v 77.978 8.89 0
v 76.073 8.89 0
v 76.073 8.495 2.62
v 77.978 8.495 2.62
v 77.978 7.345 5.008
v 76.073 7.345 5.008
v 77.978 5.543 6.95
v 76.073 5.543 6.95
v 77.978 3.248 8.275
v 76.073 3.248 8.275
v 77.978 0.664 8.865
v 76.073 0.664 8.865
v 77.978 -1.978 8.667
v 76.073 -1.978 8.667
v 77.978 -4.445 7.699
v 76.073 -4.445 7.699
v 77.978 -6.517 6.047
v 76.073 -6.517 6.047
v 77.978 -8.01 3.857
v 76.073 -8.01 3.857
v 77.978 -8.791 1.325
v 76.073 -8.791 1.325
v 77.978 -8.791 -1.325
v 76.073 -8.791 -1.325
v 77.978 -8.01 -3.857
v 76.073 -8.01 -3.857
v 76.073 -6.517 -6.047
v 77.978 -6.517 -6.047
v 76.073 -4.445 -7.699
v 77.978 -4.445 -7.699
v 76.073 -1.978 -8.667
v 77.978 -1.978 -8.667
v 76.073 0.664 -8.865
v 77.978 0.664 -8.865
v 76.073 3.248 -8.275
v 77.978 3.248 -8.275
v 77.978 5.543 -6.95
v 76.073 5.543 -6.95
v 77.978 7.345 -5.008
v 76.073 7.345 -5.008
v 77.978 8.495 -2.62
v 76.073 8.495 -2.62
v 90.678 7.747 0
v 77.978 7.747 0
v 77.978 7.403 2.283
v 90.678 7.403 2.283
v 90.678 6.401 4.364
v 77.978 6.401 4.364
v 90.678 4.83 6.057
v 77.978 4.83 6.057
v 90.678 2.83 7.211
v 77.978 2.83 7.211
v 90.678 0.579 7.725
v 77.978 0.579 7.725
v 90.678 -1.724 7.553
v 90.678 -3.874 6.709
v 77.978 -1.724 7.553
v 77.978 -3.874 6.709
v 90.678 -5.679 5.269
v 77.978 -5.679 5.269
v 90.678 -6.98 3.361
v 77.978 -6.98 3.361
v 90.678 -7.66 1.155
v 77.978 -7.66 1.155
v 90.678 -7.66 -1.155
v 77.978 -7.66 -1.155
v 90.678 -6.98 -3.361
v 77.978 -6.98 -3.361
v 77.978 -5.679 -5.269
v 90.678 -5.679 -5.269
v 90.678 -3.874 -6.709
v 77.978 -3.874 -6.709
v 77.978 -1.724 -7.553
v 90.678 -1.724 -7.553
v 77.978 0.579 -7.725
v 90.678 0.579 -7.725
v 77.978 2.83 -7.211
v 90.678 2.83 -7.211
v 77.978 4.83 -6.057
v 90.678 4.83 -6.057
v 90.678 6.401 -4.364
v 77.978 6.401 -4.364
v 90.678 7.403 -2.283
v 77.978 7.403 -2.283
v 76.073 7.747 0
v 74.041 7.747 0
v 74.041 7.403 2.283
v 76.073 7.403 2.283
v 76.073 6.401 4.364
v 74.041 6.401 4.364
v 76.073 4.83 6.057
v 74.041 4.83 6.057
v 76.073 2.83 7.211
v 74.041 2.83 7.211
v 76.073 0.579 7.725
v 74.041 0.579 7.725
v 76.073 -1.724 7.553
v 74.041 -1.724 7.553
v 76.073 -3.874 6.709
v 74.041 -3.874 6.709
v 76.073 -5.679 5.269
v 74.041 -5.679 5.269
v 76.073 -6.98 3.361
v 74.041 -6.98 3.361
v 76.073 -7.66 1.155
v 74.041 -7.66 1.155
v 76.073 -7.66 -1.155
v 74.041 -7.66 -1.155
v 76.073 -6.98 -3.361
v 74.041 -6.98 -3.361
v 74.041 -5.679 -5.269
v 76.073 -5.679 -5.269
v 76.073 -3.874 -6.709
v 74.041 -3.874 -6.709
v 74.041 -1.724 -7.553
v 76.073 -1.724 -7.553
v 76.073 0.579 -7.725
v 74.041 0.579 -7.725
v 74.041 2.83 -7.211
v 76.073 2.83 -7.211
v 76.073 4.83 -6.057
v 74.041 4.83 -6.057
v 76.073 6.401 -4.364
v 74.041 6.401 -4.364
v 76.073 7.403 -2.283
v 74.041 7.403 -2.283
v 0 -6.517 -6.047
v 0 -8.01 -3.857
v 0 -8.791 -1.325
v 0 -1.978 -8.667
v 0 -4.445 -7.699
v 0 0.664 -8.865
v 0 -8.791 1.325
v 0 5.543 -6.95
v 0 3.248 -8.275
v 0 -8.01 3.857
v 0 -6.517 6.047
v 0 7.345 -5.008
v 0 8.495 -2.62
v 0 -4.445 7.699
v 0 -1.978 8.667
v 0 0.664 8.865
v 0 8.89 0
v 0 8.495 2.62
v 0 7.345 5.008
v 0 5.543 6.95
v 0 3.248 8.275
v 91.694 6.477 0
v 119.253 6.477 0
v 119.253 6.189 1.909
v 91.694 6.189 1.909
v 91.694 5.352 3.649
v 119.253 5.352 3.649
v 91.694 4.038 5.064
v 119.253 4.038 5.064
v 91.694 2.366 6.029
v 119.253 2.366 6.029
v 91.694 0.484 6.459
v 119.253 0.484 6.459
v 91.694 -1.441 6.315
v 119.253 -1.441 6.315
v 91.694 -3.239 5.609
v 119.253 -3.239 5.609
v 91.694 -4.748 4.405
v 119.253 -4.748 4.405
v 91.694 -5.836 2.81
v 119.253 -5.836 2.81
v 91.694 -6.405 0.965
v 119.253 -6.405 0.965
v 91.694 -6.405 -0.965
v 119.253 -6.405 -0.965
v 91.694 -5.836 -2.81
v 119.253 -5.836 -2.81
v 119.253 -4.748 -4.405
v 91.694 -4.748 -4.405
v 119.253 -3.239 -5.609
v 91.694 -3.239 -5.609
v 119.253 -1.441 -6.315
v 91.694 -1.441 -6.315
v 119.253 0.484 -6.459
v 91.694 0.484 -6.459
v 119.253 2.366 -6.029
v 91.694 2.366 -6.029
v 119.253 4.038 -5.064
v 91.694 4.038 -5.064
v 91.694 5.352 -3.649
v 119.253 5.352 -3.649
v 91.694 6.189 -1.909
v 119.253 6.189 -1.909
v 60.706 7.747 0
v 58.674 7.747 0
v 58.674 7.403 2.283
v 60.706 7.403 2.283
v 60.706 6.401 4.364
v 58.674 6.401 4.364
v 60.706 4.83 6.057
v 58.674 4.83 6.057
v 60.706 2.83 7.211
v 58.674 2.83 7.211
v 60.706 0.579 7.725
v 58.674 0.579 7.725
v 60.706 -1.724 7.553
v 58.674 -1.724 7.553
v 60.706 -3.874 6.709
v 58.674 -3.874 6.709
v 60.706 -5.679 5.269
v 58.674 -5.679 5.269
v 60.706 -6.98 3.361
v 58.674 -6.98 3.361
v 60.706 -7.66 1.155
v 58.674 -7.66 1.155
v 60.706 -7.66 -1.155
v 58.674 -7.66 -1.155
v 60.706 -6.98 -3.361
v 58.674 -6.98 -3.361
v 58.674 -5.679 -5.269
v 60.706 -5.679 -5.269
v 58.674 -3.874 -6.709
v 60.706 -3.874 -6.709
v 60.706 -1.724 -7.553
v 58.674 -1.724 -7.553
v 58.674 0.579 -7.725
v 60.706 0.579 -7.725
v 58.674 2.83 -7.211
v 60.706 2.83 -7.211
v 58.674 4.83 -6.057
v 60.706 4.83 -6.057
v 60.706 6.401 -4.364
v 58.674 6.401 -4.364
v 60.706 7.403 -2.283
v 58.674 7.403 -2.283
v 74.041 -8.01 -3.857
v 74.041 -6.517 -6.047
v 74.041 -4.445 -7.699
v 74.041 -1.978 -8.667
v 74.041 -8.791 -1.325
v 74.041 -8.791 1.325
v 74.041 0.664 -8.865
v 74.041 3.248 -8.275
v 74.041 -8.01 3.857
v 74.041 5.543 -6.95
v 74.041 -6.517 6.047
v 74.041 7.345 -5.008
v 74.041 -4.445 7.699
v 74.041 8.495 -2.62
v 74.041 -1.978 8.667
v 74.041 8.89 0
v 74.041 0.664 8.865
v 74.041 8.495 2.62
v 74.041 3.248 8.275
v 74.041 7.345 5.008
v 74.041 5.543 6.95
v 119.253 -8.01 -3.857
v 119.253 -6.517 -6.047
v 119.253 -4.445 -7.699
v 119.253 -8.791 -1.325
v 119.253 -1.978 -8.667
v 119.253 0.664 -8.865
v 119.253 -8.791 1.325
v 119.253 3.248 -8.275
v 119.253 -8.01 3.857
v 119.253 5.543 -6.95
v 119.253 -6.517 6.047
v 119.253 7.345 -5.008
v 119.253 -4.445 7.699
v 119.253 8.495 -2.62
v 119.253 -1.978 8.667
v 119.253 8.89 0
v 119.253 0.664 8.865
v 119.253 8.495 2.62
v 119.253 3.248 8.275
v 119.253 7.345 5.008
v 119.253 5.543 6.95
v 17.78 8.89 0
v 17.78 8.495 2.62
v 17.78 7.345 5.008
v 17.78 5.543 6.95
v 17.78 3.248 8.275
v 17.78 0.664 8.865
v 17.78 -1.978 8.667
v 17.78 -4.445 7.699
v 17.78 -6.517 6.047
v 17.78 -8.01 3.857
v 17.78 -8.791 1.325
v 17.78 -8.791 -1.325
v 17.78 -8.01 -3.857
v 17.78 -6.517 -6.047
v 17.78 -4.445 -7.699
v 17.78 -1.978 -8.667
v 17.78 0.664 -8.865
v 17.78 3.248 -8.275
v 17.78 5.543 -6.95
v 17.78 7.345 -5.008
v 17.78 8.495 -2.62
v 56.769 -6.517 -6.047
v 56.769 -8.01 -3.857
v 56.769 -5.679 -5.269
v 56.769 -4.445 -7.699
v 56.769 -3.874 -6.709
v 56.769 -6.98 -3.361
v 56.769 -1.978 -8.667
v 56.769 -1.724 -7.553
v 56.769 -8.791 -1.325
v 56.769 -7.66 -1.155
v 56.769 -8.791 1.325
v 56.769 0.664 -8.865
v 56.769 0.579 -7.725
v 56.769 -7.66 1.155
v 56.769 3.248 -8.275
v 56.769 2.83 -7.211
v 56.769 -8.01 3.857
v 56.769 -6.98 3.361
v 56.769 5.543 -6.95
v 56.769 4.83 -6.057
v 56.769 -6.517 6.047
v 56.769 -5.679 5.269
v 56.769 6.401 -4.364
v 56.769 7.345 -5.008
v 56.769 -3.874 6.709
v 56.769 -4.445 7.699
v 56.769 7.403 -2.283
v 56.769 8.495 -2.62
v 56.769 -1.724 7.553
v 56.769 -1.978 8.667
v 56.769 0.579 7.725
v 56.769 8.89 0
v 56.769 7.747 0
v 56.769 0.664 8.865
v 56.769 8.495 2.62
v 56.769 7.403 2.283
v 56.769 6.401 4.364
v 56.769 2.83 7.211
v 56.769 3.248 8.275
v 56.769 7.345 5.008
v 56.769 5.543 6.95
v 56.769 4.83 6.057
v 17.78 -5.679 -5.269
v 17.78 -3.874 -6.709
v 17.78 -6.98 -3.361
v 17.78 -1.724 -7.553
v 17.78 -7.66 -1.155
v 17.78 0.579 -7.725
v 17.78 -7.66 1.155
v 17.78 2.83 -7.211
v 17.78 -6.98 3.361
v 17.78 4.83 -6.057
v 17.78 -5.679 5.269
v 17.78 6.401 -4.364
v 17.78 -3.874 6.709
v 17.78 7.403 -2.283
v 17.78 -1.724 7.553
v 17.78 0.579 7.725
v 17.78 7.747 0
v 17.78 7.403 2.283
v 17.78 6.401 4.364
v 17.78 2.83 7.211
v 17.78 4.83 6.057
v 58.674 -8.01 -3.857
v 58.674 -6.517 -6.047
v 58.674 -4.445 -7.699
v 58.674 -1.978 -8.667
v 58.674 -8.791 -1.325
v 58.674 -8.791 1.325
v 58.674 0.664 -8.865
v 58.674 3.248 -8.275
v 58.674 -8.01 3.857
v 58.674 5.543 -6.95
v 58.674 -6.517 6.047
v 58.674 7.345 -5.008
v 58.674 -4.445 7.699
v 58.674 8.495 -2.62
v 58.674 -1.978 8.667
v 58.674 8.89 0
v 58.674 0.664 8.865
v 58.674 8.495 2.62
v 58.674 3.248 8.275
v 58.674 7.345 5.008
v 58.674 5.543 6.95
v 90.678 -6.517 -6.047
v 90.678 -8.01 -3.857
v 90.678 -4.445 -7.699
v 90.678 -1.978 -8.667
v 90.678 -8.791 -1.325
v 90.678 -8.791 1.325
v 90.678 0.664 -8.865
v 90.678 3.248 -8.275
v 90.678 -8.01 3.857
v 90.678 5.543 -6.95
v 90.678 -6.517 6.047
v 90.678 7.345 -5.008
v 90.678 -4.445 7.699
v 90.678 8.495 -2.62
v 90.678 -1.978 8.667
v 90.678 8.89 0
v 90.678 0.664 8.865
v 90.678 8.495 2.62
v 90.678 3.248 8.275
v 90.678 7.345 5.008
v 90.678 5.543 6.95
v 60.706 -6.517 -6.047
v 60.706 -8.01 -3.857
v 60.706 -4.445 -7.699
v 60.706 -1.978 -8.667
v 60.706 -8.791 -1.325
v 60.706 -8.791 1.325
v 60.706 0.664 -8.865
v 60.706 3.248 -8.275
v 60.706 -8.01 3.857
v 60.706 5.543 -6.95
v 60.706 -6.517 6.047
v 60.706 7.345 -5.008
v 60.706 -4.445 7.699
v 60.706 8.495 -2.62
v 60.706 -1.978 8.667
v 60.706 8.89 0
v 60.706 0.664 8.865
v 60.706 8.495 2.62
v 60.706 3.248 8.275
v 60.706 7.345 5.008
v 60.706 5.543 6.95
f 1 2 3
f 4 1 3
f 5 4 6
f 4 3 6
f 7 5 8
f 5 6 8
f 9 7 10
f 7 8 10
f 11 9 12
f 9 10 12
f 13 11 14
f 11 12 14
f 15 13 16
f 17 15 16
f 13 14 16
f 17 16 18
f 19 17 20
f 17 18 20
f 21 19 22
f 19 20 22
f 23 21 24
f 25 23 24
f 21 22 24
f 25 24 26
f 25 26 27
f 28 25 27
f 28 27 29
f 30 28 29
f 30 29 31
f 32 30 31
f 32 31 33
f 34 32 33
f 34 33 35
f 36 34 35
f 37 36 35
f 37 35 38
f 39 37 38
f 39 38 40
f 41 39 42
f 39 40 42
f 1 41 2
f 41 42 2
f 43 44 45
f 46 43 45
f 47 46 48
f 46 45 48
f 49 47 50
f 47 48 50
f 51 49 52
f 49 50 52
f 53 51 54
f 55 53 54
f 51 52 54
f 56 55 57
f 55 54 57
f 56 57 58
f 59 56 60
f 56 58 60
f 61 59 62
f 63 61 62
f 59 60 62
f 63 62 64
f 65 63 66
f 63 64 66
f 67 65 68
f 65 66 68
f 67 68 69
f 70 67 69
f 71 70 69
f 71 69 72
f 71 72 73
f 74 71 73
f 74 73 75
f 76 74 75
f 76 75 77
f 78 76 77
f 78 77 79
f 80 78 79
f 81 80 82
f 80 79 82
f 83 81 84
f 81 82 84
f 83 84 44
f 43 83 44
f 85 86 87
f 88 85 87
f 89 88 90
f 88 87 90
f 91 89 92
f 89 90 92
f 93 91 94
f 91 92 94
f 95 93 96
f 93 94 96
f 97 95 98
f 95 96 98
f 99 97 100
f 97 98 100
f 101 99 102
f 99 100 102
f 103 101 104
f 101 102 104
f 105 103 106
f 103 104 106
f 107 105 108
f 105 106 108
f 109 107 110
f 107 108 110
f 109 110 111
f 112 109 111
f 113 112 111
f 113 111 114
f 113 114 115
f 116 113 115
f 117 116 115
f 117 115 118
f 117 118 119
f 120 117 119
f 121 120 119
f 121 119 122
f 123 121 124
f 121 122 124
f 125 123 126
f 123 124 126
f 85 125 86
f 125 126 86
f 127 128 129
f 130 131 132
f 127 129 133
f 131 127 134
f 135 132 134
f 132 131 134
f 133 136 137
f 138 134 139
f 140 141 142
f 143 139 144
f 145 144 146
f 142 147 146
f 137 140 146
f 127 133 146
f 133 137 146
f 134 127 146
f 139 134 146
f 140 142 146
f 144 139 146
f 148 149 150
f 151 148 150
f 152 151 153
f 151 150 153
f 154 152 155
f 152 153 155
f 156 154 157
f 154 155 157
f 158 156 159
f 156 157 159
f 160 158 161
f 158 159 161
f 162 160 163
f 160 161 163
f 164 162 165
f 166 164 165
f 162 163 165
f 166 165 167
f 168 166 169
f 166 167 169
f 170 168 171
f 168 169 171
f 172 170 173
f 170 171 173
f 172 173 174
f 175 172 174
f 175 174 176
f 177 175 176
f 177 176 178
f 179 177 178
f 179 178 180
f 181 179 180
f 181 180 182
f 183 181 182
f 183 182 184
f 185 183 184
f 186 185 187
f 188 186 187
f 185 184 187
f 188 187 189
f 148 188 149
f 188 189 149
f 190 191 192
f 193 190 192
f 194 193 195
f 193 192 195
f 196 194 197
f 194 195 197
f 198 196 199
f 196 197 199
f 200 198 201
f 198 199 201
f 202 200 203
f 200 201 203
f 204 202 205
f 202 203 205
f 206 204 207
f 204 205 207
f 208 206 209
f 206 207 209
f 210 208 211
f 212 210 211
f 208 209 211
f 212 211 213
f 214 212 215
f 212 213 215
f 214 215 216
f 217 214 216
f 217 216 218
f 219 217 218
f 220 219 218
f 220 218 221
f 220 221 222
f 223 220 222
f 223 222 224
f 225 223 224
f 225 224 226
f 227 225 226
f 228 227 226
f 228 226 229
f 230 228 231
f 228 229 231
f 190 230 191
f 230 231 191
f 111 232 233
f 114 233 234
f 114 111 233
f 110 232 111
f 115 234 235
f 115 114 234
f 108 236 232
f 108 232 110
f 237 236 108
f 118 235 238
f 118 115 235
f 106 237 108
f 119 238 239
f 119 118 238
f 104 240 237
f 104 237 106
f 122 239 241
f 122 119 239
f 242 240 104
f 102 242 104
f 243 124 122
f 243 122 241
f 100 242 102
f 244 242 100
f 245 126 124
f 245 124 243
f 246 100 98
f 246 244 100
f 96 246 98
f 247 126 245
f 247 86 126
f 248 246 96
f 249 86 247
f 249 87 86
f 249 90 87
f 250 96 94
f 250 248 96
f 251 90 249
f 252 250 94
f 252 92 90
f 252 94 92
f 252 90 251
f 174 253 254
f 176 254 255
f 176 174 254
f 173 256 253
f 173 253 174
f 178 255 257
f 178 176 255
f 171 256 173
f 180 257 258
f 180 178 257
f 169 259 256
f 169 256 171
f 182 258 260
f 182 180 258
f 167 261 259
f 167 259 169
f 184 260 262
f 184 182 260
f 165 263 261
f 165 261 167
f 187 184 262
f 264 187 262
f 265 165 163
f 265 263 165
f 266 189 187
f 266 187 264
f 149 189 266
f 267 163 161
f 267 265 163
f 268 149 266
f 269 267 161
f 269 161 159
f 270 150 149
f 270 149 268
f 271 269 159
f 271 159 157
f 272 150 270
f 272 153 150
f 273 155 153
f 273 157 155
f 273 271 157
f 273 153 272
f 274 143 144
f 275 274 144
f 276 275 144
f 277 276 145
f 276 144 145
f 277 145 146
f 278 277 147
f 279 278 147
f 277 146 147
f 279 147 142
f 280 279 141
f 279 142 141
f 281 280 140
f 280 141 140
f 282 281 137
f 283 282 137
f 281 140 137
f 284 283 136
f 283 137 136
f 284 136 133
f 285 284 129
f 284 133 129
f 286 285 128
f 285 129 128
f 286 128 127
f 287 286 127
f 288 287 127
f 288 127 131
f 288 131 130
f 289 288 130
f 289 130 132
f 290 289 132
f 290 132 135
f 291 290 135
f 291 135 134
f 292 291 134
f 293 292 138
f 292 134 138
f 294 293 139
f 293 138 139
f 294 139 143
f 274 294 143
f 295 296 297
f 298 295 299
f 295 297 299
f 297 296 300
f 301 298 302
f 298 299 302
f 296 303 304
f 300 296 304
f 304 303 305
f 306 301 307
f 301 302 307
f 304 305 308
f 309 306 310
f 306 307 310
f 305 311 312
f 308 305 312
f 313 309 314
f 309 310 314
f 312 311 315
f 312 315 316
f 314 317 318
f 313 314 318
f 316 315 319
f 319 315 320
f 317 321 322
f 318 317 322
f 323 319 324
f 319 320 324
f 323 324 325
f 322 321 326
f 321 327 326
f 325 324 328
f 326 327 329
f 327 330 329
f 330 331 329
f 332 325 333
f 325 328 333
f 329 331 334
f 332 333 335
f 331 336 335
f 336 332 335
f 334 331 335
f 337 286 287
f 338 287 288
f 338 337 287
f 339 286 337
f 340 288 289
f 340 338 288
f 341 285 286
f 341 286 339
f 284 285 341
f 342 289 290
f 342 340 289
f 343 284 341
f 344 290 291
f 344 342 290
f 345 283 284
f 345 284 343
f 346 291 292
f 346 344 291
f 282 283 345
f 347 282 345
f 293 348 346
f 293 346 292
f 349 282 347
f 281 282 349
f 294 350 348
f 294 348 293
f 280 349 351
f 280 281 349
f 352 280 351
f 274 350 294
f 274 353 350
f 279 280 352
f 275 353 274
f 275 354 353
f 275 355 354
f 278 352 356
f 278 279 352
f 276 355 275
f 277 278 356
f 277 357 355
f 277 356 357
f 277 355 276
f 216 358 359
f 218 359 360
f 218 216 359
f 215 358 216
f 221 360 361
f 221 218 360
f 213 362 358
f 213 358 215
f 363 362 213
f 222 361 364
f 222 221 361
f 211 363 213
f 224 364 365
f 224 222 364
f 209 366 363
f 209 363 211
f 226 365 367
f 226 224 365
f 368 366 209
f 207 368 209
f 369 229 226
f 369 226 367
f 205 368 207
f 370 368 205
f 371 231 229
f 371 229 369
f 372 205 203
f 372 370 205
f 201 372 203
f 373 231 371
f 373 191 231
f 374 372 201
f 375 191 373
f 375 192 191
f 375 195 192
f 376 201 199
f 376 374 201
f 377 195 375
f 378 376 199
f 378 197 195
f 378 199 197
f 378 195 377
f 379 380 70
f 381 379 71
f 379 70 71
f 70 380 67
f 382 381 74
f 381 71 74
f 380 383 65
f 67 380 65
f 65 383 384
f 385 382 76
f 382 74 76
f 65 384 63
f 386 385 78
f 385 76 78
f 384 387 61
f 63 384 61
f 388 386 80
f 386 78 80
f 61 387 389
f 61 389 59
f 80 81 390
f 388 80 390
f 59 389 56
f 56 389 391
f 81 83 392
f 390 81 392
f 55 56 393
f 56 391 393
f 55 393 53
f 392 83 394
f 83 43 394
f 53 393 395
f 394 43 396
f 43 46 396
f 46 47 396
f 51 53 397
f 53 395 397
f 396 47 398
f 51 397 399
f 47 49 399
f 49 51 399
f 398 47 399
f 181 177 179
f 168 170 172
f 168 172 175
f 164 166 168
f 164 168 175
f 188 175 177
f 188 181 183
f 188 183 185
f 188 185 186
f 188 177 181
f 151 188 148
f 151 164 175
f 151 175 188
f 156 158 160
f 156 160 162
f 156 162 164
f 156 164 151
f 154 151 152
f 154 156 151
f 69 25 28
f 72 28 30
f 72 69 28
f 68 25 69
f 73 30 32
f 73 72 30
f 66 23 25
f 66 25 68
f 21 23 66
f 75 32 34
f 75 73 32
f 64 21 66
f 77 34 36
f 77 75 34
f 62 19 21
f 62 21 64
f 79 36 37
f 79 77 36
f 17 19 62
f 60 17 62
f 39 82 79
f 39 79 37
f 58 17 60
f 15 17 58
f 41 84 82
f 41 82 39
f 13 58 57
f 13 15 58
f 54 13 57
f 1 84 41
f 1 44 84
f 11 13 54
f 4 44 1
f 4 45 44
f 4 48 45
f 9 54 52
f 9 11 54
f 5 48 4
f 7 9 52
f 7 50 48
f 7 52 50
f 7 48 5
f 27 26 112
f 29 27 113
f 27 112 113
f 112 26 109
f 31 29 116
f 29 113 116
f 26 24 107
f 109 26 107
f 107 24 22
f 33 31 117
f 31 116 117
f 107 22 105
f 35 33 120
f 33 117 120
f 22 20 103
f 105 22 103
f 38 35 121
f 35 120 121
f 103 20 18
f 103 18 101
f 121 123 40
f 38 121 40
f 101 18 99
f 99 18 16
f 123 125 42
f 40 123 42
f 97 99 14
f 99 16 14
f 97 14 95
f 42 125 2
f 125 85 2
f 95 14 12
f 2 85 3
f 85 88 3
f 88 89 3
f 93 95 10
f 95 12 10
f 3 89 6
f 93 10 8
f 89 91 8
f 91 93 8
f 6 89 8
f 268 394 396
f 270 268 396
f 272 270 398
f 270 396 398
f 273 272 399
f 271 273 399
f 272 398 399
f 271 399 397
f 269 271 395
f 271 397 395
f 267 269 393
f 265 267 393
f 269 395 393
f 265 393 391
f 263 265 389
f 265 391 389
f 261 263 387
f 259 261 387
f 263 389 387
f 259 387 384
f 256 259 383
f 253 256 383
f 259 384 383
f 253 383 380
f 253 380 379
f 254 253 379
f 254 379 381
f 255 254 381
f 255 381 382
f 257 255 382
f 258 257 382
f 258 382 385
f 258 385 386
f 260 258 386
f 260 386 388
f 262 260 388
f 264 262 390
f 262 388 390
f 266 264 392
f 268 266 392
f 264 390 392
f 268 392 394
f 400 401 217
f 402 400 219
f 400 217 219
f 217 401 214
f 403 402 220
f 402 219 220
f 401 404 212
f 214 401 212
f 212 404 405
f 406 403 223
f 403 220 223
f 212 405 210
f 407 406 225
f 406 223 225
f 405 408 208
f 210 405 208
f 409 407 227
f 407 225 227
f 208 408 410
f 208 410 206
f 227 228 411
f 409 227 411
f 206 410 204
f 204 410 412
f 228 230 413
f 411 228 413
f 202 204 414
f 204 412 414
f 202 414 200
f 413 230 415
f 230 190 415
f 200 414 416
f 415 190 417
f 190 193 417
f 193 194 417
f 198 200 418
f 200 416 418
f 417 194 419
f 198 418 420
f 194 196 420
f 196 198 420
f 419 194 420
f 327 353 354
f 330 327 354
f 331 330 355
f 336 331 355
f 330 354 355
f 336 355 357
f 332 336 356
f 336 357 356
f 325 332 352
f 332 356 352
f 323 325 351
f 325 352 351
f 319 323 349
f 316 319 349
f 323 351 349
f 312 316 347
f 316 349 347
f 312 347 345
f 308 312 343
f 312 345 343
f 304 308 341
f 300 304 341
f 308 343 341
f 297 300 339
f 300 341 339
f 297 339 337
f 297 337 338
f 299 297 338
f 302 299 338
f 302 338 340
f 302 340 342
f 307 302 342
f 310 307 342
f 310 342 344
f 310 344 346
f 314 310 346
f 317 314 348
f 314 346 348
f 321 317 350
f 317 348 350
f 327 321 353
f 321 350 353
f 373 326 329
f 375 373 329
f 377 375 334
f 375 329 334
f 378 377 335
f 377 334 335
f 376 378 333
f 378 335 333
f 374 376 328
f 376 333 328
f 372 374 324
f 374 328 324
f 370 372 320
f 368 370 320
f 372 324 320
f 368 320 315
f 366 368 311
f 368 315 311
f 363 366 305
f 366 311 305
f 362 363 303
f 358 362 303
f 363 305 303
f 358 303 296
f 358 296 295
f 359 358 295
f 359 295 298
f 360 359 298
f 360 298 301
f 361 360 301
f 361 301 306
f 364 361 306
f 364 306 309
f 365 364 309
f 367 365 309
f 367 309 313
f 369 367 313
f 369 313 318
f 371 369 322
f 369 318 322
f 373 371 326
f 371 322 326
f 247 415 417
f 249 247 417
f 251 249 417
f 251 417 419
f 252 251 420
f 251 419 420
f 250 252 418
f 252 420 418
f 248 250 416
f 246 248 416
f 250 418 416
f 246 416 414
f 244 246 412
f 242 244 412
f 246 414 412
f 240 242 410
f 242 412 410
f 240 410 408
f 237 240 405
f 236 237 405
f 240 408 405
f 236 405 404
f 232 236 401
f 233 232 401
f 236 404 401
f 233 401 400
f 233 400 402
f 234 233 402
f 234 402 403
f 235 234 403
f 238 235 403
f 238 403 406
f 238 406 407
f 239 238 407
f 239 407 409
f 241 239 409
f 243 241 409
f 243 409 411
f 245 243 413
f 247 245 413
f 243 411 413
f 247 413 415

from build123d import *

# Parameters (mm, degrees)
F0_R      = 8.89
F1_DEPTH  = 17.78
F2_R      = 7.747
F3_DEPTH  = 38.989
F4_R      = 8.89
F5_DEPTH  = 1.905
F6_R      = 7.747
F7_DEPTH  = 2.032
F8_R      = 8.89
F9_DEPTH  = 13.335
F10_R     = 7.747
F11_DEPTH = 2.032
F12_R     = 8.89
F13_DEPTH = 1.905
F14_R     = 7.747
F15_DEPTH = 12.7
F16_R     = 8.89
F17_DEPTH = 28.575
F18_R     = 6.477
F19_DEPTH = 27.559


with BuildPart() as f1:
    # F0 (on Right) → F1 (new body)
    with BuildSketch(Plane.YZ):
        Circle(F0_R)
    extrude(amount=F1_DEPTH)

    # F2 (on face) → F3 (join)
    with BuildSketch(Plane.YZ.offset(17.78)):
        Circle(F2_R)
    extrude(amount=F3_DEPTH)

    # F4 (on face) → F5 (join)
    with BuildSketch(Plane.YZ.offset(56.769)):
        Circle(F4_R)
    extrude(amount=F5_DEPTH)

    # F6 (on face) → F7 (join)
    with BuildSketch(Plane.YZ.offset(58.674)):
        Circle(F6_R)
    extrude(amount=F7_DEPTH)

    # F8 (on face) → F9 (join)
    with BuildSketch(Plane.YZ.offset(60.706)):
        Circle(F8_R)
    extrude(amount=F9_DEPTH)

    # F10 (on face) → F11 (join)
    with BuildSketch(Plane.YZ.offset(74.041)):
        Circle(F10_R)
    extrude(amount=F11_DEPTH)

    # F12 (on face) → F13 (join)
    with BuildSketch(Plane.YZ.offset(76.073)):
        Circle(F12_R)
    extrude(amount=F13_DEPTH)

    # F14 (on face) → F15 (join)
    with BuildSketch(Plane.YZ.offset(77.978)):
        Circle(F14_R)
    extrude(amount=F15_DEPTH)

    # F16 (on face) → F17 (join)
    with BuildSketch(Plane.YZ.offset(90.678)):
        Circle(F16_R)
    extrude(amount=F17_DEPTH)

    # F18 (on face) → F19 (cut)
    with BuildSketch(Plane.YZ.offset(119.253)):
        Circle(F18_R)
    extrude(amount=-F19_DEPTH, mode=Mode.SUBTRACT)


solid = f1.part
